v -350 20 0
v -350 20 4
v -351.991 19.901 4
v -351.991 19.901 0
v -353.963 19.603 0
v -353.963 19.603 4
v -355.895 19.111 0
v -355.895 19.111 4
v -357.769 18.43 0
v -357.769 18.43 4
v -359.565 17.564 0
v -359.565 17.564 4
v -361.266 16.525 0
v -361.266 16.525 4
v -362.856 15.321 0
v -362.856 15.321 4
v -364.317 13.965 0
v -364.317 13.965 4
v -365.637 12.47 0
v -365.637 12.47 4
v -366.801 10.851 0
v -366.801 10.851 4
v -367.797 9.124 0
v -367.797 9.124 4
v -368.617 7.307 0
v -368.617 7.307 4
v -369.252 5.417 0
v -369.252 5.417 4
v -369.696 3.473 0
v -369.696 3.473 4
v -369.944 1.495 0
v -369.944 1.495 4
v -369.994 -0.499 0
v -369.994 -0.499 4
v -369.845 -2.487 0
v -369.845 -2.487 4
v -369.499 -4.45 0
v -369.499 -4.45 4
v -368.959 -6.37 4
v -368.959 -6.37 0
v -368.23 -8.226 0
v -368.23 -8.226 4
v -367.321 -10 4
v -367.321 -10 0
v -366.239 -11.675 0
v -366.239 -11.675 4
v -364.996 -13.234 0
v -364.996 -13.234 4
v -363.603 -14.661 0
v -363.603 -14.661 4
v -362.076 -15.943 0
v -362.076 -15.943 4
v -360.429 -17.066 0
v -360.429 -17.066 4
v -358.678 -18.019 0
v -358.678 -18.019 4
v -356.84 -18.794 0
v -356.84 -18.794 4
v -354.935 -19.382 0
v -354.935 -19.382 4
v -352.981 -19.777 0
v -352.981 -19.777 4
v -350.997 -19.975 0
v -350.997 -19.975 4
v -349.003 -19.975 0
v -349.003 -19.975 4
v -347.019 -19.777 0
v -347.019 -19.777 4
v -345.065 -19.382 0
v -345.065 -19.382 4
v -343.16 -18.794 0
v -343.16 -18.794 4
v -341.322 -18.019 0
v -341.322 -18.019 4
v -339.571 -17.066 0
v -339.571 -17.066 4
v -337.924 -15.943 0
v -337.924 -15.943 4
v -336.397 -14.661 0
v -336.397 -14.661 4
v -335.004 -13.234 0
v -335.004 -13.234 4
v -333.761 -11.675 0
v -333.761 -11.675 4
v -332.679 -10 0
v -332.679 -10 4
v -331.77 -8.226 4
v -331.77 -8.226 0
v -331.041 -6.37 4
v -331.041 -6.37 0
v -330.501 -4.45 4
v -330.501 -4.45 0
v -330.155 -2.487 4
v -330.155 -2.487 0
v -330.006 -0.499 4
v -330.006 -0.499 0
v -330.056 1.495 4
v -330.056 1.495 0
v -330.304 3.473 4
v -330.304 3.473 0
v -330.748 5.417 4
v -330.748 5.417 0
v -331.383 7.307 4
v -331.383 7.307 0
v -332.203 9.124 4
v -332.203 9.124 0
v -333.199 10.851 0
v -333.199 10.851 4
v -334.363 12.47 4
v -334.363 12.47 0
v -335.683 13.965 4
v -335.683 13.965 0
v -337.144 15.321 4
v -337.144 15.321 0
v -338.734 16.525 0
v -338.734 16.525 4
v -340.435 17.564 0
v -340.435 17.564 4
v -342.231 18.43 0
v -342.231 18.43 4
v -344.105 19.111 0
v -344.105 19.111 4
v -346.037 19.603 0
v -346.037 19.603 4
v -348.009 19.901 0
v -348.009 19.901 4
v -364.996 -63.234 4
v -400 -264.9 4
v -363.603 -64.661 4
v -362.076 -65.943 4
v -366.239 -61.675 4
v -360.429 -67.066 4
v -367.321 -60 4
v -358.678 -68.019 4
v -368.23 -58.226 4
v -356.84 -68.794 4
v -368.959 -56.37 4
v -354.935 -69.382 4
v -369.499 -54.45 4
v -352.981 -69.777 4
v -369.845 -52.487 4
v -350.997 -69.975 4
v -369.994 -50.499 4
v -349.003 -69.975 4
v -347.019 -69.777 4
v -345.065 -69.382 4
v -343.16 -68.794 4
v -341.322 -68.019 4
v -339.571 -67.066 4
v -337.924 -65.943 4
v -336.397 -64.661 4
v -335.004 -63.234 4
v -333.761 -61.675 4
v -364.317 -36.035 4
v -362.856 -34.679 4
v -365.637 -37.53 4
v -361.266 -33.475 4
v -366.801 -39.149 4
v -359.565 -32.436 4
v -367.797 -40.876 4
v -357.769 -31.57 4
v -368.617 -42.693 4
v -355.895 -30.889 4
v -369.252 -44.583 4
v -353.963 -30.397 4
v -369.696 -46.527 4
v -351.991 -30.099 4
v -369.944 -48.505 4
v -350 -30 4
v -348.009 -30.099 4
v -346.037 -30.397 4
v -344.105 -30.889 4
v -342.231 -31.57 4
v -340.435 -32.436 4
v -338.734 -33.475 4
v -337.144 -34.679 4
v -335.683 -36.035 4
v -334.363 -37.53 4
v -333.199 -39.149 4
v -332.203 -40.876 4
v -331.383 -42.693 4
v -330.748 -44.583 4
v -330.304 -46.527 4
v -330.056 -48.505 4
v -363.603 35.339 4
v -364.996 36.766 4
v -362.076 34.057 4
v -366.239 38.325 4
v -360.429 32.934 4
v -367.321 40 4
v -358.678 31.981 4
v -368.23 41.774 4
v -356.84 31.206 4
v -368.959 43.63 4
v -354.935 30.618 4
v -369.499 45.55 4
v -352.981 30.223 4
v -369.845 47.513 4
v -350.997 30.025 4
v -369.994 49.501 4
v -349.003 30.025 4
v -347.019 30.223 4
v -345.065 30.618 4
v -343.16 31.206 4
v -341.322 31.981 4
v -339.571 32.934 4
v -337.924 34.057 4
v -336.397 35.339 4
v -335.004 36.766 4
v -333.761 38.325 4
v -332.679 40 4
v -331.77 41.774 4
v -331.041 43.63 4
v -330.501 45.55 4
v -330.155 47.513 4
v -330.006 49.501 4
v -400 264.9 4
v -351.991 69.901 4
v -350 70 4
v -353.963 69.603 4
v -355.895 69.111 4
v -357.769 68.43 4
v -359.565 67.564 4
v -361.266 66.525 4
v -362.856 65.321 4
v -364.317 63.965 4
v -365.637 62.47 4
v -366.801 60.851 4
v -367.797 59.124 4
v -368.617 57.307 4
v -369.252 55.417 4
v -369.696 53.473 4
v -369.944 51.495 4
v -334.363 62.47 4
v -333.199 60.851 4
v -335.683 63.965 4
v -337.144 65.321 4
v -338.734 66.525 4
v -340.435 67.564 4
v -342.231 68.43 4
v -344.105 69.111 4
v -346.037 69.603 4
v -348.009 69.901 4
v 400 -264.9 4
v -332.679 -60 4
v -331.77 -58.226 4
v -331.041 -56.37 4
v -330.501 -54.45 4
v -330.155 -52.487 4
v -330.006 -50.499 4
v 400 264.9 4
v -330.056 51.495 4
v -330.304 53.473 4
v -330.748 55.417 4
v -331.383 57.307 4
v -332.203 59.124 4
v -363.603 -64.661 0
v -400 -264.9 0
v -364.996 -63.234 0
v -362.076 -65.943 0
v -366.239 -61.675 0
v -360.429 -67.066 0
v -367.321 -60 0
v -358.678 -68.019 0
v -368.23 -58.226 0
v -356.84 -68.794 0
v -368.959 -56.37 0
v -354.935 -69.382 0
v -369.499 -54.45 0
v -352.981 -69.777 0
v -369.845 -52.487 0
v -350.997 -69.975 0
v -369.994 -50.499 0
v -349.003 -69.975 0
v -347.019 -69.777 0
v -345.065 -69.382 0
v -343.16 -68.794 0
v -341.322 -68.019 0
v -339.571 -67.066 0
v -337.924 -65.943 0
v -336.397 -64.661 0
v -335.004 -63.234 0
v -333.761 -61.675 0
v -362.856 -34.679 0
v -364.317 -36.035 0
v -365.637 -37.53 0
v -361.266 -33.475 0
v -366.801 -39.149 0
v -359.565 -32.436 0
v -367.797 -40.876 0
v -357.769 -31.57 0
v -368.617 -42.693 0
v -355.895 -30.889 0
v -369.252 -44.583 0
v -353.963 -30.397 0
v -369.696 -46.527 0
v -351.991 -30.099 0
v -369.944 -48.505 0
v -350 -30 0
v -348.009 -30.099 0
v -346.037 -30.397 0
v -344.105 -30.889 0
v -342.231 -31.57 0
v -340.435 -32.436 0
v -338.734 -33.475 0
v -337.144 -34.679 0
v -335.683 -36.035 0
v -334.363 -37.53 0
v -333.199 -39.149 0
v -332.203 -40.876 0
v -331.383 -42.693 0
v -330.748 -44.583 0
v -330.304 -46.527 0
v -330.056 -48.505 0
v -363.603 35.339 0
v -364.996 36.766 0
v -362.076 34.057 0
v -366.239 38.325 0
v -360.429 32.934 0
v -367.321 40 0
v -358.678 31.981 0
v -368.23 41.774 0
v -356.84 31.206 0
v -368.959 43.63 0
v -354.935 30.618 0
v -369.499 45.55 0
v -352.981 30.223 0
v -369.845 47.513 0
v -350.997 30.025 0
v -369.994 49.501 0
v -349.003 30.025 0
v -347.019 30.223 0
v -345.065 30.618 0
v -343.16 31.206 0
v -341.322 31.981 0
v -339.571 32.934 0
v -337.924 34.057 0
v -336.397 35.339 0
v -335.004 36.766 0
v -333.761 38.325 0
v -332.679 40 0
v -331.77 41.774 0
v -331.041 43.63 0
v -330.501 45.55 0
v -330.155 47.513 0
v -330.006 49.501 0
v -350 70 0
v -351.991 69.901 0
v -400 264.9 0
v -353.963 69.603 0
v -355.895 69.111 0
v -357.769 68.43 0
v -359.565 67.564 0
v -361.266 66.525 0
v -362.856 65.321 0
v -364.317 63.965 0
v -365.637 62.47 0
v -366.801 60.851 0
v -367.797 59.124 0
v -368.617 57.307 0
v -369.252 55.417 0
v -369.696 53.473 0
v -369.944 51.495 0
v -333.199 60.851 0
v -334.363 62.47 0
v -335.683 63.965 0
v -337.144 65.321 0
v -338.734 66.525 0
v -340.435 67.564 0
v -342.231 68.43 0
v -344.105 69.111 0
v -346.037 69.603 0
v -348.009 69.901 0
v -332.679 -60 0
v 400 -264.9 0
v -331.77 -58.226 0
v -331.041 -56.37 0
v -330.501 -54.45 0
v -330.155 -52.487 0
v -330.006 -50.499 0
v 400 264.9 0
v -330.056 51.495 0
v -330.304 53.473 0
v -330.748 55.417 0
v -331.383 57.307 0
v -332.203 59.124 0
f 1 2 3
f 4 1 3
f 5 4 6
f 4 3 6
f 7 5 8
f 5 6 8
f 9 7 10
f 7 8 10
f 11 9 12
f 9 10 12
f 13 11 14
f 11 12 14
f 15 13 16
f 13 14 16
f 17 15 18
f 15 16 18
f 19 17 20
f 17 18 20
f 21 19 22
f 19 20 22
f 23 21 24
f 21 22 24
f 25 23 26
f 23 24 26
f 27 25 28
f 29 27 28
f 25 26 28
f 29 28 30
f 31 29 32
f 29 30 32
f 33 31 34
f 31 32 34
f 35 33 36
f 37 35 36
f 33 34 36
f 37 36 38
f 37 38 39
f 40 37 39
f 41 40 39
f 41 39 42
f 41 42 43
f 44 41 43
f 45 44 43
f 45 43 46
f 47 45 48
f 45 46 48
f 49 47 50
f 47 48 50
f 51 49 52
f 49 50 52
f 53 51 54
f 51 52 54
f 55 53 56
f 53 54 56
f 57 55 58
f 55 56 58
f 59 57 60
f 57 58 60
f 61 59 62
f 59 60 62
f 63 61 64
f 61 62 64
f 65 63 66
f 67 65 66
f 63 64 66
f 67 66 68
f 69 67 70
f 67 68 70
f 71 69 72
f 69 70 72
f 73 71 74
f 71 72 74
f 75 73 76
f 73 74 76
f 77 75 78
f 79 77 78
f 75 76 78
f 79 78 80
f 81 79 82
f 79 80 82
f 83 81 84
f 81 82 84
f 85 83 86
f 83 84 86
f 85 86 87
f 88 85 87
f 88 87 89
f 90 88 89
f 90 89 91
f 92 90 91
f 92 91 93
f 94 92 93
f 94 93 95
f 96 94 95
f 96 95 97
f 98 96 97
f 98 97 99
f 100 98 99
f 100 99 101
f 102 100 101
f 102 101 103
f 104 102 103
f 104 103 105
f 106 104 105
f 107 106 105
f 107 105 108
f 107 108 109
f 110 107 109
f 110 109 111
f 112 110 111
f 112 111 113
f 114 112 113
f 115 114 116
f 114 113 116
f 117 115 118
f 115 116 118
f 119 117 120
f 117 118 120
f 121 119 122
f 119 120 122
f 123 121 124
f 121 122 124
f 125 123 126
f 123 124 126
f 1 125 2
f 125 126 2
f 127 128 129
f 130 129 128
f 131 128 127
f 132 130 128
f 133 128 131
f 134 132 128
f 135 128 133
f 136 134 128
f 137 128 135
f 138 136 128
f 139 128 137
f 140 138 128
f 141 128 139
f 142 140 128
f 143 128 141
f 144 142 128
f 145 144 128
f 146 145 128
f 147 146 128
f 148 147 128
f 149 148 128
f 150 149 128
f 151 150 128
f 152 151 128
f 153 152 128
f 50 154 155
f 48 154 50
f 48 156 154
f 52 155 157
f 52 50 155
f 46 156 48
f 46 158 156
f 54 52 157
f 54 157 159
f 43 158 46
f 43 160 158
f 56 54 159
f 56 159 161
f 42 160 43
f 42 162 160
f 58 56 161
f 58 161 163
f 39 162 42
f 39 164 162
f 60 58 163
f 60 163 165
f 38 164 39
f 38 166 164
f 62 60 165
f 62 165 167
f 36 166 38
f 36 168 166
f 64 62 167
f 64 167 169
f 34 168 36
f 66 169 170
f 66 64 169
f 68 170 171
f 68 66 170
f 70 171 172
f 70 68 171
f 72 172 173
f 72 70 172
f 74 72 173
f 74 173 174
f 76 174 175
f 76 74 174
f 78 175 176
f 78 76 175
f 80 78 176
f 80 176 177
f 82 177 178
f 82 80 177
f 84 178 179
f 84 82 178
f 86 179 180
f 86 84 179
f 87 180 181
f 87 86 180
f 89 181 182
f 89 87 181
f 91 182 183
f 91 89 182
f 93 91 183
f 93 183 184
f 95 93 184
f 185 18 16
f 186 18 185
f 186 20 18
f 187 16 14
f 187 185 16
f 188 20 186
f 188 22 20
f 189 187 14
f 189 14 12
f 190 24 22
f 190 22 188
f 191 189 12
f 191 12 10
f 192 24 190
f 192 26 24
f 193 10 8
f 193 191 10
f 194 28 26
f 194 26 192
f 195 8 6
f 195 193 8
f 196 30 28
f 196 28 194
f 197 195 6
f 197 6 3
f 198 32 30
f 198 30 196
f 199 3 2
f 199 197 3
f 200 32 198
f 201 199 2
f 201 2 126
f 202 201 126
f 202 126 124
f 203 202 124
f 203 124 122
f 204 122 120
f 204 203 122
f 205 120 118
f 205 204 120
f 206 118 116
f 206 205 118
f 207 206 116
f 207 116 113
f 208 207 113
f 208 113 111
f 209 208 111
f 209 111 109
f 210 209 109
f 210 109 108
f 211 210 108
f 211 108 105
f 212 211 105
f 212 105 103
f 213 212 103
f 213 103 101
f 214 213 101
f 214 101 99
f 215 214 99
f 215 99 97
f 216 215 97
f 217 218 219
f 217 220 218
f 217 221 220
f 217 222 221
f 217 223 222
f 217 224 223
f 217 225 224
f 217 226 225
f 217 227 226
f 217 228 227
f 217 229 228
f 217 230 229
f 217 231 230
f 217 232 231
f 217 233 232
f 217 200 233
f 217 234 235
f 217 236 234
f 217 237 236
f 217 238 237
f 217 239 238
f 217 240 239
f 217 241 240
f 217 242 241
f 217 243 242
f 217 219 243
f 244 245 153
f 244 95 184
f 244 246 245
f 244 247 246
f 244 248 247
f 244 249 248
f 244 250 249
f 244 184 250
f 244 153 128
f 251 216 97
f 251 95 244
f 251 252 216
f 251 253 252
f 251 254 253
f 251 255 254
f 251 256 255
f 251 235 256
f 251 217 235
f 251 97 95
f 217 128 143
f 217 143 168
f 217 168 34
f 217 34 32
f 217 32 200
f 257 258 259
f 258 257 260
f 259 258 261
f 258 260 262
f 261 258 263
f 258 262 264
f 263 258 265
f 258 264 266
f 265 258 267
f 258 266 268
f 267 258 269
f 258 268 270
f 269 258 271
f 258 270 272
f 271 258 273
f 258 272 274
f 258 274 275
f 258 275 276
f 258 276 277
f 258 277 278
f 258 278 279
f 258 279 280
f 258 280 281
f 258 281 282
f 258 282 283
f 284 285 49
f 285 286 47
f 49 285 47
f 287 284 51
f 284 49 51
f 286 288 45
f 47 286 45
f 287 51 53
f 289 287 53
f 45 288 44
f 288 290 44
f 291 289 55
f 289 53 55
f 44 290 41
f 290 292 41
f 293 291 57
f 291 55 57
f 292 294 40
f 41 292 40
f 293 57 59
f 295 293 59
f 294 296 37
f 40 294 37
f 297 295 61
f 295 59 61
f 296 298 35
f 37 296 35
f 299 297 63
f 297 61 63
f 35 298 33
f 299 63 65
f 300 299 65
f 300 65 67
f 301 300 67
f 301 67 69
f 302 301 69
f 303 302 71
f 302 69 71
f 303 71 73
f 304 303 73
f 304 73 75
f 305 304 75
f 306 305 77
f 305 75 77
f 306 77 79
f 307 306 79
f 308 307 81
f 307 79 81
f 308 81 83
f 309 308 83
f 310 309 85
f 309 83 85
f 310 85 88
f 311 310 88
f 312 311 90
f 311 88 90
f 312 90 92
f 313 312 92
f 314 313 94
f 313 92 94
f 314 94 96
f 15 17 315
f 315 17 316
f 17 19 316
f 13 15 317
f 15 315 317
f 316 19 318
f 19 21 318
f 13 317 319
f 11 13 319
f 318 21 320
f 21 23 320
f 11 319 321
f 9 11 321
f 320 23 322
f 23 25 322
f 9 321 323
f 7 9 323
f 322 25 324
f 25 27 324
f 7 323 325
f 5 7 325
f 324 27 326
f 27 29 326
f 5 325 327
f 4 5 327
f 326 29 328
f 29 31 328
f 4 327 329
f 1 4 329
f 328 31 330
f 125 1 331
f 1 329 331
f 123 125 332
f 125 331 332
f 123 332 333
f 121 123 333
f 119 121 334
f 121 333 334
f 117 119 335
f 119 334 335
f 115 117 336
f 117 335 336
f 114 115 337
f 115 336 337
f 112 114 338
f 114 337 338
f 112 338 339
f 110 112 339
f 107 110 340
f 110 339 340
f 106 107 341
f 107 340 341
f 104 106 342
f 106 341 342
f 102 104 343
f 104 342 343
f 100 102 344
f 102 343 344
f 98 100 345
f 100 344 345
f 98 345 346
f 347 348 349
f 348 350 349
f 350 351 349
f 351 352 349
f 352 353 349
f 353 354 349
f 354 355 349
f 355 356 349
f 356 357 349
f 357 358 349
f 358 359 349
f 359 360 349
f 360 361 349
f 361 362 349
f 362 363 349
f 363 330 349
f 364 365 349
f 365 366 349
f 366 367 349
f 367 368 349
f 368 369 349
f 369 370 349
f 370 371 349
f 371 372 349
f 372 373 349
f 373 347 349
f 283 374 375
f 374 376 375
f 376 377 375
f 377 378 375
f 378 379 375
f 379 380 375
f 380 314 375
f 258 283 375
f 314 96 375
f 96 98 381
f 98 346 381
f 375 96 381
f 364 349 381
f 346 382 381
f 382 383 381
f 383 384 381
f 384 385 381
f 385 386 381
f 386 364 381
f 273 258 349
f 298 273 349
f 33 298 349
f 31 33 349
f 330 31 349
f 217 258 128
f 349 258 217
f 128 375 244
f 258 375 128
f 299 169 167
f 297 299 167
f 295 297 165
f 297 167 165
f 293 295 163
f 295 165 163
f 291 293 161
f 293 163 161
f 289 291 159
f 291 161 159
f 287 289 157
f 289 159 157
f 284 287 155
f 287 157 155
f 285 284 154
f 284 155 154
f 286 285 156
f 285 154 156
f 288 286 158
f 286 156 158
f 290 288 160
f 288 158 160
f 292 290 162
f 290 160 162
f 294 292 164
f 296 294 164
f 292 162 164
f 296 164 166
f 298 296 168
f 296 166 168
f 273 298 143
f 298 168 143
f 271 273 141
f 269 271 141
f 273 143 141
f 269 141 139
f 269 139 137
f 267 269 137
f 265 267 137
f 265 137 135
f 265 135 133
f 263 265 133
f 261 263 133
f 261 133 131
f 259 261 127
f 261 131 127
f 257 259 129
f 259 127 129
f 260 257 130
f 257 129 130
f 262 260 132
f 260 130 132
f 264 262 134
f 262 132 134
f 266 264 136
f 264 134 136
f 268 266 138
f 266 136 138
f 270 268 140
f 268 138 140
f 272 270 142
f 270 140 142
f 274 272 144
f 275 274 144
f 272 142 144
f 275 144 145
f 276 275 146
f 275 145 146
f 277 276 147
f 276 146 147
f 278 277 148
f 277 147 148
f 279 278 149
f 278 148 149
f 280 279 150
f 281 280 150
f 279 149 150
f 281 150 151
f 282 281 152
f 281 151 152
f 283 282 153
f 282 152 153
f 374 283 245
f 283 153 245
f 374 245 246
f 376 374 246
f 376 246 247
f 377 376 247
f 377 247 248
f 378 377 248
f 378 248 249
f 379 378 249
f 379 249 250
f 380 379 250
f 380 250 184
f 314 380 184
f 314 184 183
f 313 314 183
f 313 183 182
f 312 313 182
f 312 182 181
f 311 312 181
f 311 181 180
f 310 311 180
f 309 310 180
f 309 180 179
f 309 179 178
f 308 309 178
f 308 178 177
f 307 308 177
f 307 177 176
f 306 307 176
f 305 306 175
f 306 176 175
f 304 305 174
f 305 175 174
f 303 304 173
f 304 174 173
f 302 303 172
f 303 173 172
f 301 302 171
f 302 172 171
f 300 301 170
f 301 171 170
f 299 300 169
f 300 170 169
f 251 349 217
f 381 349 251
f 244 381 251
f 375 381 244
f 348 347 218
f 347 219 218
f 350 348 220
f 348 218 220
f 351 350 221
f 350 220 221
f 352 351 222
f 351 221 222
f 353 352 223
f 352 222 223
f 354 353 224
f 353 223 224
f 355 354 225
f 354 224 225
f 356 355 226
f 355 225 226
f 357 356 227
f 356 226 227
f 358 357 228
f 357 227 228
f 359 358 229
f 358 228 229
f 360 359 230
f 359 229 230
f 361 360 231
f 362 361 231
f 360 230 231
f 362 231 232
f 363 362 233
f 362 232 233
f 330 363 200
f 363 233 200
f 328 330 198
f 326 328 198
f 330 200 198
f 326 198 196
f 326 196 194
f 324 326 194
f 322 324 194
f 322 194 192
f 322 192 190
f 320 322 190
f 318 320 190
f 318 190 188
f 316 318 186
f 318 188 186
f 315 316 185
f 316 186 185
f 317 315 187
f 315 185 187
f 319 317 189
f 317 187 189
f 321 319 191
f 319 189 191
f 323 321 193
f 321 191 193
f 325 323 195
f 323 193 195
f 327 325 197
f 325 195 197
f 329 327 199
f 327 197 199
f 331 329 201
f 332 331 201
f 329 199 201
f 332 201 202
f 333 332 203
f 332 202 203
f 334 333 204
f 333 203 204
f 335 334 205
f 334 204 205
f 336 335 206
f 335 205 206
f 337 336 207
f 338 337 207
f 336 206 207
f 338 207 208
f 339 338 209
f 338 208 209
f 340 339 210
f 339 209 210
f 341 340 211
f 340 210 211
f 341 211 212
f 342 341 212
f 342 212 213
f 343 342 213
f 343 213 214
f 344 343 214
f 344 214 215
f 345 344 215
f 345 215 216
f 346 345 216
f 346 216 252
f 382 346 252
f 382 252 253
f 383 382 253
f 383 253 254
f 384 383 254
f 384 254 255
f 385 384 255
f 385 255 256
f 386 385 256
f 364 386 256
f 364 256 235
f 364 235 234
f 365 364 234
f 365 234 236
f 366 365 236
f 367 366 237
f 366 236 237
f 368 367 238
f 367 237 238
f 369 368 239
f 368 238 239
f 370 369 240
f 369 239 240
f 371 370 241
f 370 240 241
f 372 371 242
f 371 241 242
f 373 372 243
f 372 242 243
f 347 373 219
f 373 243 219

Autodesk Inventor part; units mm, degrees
ref_plane "YZ Plane" through (0, 0, 0) normal (1, 0, 0) x (0, 1, 0)
ref_plane "XZ Plane" through (0, 0, 0) normal (0, 1, 0) x (-1, 0, 0)
ref_plane "XY Plane" through (0, 0, 0) normal (0, 0, 1) x (1, 0, 0)
sketch "Skizze1" plane through (0, 0, 0) normal (0, 0, 1) x (1, 0, 0)
  line L0 (0, 370.86) -> (0, -370.86) projected
  line L1 (-560, 0) -> (560, 0) projected
  line L2 (400, -264.9) -> (-400, -264.9)
  line L3 (-400, -264.9) -> (-400, 264.9)
  line L4 (-400, 264.9) -> (400, 264.9)
  line L5 (400, 264.9) -> (400, -264.9)
  point P0 (0, 0)
  point P1 (0, -264.9)
  point P2 (-400, 0)
  dimension "d0" = 800
  dimension "d1" = 529.8
extrude "Extrusion1" add sketch "Skizze1" along normal blind 4
sketch "Skizze2" plane through (0, 0, 0) normal (0, 0, -1) x (-1, 0, 0)
  line L0 (400, 264.9) -> (400, -264.9) projected
  line L1 (-400, 264.9) -> (400, 264.9) projected
  point P0 (0, 0)
  point P1 (350, 50)
  point P2 (350, 0)
  point P3 (350, -50)
  dimension "d4" = 50
  dimension "d5" = 50
  dimension "d6" = 50
  dimension "d7" = 50
  dimension "d8" = 50
  dimension "d9" = 264.9
hole "Bohrung1" at (-350, 50, 0) at (-350, 0, 0) at (-350, -50, 0) direction (0, 0, 1) diameter 40 end through all
equation "\"d5\" = d4"
equation "\"d6\" = d5"
equation "\"d8\" = d7"
properties part number "Käfigboden" material "PVC-U"
